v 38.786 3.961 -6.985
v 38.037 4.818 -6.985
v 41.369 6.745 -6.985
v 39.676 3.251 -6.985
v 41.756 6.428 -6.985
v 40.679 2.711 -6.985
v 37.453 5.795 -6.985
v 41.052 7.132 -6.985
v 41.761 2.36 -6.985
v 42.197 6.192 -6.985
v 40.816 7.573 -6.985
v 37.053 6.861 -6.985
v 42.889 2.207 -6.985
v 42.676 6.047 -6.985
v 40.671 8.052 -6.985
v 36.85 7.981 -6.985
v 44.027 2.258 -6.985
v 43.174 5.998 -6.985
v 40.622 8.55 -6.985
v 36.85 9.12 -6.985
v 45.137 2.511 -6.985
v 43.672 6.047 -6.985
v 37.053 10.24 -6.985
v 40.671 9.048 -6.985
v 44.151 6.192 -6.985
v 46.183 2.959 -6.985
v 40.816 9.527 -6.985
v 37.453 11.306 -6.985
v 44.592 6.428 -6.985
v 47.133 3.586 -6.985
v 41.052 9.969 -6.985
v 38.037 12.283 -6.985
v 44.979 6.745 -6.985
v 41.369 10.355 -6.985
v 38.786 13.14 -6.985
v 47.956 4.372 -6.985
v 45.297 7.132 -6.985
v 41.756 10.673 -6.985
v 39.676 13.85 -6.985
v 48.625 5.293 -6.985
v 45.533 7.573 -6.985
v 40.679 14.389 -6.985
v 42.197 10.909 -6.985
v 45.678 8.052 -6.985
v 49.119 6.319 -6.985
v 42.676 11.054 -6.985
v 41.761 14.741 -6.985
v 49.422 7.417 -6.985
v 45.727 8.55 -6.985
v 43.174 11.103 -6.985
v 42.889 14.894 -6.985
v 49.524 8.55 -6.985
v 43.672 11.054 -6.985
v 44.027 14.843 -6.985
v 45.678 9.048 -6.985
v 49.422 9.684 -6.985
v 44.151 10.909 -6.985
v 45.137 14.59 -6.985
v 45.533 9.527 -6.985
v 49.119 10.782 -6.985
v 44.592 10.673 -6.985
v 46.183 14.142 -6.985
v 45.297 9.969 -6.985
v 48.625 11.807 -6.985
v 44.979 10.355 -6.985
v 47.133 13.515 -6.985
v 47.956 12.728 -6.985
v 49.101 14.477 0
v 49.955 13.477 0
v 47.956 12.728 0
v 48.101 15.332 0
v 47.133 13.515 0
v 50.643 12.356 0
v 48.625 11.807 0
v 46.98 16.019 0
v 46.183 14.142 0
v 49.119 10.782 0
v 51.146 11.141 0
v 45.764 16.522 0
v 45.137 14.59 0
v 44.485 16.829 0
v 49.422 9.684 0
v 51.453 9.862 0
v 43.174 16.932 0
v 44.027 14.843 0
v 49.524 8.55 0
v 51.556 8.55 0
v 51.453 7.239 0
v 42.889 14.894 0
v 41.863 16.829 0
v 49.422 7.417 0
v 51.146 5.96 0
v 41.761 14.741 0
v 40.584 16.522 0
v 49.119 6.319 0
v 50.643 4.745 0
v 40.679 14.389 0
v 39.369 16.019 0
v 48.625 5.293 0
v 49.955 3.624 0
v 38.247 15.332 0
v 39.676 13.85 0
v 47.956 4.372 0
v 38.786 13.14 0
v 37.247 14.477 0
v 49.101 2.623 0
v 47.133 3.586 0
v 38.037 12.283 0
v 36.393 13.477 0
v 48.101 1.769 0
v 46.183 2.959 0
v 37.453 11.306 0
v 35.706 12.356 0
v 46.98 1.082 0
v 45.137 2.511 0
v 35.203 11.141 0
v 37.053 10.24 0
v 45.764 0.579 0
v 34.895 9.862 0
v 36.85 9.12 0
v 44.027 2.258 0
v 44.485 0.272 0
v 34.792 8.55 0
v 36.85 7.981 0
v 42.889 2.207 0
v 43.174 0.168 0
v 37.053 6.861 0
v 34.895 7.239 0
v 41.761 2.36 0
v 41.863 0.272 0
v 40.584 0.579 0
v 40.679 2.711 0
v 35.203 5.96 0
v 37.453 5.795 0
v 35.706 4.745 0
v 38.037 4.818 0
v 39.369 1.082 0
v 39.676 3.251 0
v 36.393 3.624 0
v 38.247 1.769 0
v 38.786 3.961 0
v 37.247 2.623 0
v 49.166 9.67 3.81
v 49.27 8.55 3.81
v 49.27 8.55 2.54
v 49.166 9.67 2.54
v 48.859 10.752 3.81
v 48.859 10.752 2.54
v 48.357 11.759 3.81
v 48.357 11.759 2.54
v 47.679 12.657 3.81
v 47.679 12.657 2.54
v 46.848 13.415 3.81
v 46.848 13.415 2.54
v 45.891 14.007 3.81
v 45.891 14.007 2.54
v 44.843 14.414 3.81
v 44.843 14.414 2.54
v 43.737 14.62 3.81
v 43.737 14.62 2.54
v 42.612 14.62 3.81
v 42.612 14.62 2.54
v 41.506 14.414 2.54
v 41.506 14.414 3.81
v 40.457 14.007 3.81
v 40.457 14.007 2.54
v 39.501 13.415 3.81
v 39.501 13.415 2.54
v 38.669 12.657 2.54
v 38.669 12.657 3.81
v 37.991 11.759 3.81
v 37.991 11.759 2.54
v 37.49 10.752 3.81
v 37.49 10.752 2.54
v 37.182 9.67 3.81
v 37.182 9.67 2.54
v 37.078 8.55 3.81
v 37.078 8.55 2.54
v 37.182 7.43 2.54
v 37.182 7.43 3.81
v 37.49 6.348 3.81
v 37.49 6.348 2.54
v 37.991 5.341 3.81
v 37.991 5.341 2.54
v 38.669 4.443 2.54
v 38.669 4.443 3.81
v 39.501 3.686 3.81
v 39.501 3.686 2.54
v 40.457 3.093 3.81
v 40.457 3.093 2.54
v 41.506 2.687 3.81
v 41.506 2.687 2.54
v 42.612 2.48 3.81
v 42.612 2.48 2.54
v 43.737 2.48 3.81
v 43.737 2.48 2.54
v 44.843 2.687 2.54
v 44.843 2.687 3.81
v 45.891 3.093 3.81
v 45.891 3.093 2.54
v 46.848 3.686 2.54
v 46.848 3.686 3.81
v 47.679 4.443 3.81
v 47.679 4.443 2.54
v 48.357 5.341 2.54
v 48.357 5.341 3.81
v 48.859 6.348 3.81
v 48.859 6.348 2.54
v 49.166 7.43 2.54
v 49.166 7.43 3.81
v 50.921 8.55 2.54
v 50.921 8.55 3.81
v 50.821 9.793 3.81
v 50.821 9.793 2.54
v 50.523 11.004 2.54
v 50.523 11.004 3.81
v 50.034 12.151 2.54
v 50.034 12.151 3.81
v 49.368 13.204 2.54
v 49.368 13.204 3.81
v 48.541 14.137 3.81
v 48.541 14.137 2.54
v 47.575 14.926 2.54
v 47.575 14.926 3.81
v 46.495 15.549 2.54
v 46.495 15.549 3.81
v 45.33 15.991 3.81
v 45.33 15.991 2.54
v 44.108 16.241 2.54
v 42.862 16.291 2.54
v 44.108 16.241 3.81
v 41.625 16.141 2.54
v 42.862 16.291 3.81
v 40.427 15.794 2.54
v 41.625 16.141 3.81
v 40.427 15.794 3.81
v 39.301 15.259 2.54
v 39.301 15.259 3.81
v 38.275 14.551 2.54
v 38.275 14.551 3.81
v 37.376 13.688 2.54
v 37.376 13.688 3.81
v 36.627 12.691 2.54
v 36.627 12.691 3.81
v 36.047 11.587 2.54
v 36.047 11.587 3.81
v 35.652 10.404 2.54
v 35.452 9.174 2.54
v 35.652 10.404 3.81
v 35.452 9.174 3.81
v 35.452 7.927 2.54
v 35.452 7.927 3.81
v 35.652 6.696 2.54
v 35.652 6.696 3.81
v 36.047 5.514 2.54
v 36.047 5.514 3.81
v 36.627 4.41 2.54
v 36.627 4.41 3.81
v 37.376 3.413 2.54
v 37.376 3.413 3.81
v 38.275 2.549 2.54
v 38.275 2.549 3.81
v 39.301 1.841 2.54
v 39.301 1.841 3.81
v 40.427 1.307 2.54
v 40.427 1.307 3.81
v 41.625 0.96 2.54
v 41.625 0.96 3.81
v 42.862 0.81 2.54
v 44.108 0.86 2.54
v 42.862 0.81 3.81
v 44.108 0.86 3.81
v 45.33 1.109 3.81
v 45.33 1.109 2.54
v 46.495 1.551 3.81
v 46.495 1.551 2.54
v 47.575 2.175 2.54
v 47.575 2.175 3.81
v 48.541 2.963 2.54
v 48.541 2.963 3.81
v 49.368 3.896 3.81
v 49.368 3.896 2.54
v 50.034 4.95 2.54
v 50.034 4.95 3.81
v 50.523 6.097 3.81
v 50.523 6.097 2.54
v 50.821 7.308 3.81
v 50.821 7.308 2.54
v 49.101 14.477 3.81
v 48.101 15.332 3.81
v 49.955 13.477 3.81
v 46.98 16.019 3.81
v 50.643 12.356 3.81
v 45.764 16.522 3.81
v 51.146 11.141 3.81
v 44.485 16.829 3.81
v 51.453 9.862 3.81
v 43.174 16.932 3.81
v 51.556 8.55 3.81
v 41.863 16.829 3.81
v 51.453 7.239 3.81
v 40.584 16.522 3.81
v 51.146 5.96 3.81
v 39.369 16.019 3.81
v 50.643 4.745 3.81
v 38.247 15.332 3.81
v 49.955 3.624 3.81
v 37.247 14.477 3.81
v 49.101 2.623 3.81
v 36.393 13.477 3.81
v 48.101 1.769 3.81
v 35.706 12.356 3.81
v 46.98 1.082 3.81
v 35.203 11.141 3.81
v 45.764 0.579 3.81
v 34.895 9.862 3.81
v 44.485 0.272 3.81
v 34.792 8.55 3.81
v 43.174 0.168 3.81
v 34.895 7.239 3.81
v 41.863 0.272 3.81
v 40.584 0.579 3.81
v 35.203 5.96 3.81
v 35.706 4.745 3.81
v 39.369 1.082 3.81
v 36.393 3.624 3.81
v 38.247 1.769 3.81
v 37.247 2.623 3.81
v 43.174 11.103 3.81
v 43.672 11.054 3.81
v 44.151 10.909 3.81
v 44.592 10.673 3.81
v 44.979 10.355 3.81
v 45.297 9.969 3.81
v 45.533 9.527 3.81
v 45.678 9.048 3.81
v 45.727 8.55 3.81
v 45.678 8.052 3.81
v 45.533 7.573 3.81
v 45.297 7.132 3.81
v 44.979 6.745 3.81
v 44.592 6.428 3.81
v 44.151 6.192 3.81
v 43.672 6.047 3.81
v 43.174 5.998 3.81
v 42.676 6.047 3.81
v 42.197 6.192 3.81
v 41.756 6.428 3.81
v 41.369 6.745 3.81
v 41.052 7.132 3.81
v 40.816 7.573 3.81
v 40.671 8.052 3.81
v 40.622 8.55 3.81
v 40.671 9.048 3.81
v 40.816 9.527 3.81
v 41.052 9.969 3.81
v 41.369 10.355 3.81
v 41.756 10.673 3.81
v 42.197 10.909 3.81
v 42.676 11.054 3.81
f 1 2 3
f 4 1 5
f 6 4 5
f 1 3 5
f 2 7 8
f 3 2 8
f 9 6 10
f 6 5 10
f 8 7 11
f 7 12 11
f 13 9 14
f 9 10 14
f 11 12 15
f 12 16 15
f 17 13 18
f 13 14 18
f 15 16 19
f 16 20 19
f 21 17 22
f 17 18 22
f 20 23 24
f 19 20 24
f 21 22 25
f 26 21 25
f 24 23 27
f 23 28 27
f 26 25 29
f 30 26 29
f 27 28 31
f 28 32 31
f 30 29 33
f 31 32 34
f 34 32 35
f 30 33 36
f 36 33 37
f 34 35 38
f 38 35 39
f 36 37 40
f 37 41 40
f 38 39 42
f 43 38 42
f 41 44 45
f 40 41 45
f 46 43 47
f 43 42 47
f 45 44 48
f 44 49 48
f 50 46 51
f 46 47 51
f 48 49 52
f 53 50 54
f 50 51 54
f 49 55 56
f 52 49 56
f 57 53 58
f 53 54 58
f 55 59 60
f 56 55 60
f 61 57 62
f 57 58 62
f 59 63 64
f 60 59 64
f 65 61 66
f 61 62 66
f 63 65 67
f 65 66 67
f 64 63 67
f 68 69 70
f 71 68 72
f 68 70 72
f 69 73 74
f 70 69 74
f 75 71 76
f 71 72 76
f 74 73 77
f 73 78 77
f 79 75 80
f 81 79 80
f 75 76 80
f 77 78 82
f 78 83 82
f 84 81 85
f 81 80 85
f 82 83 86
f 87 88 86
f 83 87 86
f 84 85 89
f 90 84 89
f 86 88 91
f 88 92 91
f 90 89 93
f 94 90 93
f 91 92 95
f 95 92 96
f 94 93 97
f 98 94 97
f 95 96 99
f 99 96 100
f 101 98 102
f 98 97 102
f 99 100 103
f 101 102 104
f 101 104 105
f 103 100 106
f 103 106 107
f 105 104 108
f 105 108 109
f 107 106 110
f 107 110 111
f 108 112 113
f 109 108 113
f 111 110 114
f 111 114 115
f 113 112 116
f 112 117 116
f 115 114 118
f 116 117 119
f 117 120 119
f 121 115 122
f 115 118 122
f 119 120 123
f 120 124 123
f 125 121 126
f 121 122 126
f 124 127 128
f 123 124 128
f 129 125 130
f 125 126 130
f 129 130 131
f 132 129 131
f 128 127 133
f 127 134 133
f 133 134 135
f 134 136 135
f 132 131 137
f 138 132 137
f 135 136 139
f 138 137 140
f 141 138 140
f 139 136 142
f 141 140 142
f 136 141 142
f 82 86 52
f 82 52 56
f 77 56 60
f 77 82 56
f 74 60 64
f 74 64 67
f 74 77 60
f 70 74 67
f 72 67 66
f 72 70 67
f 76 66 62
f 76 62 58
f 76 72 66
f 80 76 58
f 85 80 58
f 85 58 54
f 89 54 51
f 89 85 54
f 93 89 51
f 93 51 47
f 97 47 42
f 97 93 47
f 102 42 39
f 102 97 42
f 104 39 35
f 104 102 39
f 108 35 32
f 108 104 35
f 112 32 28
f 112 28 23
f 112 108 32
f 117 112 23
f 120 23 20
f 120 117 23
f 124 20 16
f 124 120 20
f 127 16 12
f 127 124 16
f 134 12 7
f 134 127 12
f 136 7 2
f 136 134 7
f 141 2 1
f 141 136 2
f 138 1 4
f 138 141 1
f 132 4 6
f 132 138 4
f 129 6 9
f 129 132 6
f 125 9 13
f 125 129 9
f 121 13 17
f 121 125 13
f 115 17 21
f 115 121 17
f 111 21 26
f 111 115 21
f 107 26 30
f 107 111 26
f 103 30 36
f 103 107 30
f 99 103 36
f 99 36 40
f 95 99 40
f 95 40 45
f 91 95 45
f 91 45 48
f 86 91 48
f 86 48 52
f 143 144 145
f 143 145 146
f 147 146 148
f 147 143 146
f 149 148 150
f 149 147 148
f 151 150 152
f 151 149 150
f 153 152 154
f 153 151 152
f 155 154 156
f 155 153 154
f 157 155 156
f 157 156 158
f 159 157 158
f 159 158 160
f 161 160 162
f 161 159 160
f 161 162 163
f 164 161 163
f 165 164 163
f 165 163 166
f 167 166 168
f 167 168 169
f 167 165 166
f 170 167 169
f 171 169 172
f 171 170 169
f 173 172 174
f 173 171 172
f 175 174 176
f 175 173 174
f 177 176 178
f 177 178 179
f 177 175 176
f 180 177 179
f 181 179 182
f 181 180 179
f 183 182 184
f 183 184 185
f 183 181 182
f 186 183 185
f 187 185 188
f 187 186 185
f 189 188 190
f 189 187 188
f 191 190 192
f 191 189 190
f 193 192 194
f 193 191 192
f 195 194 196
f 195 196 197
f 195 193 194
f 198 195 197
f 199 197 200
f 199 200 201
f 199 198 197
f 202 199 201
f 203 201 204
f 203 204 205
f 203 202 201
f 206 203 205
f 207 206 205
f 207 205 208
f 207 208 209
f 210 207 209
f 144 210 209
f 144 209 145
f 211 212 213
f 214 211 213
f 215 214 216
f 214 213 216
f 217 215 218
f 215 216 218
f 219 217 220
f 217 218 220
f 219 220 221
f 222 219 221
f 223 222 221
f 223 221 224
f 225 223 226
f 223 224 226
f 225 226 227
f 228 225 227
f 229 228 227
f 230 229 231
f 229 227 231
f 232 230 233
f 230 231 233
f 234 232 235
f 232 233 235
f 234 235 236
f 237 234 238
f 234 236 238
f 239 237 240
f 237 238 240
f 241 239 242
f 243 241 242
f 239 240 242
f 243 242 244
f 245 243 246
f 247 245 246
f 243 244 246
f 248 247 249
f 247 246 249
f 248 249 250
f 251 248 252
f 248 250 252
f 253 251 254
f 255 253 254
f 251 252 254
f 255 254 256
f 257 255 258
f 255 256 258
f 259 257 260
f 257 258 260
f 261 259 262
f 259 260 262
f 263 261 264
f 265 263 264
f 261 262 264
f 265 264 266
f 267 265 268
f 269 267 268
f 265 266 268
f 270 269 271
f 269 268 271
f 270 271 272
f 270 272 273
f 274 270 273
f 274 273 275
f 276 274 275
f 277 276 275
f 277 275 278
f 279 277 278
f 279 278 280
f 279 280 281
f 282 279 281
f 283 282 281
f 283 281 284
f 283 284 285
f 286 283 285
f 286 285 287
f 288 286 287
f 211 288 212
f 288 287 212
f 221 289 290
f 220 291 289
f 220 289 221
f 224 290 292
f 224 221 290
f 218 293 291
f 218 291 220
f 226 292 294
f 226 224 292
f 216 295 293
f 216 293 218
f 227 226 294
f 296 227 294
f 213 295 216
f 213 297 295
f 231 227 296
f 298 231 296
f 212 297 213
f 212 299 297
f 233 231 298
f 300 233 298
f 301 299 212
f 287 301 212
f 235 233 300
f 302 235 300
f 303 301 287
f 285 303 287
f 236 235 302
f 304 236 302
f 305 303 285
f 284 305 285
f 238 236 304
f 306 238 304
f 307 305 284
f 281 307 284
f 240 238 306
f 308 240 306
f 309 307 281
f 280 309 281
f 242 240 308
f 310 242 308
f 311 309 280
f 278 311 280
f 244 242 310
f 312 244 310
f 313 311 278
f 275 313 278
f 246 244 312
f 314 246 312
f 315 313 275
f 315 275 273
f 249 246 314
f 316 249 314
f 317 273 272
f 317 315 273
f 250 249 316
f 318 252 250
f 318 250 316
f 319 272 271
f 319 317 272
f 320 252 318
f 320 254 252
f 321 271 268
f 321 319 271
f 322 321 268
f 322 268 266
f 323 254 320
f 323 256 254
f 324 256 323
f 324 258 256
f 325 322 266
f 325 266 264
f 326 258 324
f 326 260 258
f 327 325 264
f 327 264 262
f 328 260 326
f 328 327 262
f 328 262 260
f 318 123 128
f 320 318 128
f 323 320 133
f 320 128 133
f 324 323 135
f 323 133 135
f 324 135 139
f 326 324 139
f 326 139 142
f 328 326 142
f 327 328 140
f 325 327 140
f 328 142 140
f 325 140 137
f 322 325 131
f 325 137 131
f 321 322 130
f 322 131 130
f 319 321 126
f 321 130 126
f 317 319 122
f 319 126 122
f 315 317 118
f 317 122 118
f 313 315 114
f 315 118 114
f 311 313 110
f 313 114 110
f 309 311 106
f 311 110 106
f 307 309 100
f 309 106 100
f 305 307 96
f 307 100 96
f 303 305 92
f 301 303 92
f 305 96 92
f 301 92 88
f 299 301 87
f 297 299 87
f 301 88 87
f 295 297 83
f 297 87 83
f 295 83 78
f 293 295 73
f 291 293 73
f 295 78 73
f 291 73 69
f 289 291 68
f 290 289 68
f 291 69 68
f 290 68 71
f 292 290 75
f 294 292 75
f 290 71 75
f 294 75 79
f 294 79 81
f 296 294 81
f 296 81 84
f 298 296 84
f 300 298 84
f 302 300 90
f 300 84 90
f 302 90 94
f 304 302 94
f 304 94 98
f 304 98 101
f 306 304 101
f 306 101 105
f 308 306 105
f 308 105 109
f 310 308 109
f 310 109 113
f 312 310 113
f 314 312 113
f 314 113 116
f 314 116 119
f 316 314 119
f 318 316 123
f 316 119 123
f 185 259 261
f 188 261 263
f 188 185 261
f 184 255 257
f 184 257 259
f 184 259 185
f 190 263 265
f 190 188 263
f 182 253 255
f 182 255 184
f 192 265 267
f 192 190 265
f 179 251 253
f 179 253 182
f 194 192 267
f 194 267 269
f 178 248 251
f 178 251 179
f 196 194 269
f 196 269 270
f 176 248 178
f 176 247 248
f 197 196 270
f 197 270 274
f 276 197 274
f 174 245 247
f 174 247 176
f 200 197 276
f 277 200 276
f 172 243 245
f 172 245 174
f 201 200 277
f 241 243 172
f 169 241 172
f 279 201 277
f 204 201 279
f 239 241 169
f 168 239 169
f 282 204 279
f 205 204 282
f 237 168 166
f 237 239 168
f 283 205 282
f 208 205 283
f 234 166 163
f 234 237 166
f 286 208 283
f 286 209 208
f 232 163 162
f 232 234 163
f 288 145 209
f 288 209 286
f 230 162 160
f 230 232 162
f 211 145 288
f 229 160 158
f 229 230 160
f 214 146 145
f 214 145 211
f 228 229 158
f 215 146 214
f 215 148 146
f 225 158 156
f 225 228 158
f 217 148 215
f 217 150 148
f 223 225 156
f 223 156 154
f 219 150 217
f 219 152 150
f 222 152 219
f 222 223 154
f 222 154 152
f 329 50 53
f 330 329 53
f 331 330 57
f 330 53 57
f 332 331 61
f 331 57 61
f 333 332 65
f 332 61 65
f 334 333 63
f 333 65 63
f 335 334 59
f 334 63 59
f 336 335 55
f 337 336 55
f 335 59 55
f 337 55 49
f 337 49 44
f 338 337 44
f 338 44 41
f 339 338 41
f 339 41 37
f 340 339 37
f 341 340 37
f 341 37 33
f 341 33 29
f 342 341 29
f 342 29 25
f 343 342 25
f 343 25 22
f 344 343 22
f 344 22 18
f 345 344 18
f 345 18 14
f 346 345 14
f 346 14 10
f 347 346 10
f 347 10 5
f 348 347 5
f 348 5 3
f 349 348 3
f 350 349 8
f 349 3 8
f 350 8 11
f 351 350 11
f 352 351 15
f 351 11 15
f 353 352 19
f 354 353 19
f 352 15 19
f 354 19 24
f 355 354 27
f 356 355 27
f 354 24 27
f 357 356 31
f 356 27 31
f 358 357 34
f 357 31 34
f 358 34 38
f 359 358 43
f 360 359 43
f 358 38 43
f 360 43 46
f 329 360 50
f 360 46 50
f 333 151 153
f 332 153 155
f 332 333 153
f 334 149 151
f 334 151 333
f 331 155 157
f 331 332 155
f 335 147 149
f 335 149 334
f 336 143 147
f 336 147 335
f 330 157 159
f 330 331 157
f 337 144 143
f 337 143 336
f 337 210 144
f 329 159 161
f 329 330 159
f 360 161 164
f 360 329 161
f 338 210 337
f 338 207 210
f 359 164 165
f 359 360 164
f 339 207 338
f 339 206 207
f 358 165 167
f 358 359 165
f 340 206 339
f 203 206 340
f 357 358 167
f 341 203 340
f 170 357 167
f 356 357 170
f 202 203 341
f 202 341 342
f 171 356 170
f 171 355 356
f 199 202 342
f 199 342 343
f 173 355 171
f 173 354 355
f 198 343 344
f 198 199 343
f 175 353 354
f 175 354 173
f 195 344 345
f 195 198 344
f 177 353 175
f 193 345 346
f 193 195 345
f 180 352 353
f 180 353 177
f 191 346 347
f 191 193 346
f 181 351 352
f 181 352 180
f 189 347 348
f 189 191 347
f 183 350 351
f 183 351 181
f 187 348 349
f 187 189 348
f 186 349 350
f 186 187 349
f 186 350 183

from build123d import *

# Parameters (mm, degrees)
SKETCH1_R           = 6.35
BOSS_EXTRUDE1_DEPTH = 6.985
SKETCH3_R           = 8.382
BOSS_EXTRUDE2_DEPTH = 3.81
SKETCH5_R           = 2.5527
CUT_EXTRUDE2_DEPTH  = 56.328875207
SKETCH6_R           = 7.747
SKETCH6_R_2         = 6.096
CUT_EXTRUDE3_DEPTH  = 1.27


with BuildPart() as part:
    # Sketch1 → Boss-Extrude1 (new body)
    with BuildSketch(Plane.XY):
        with Locations((43.174261814, 8.550344032)):
            Circle(SKETCH1_R)
    extrude(amount=-BOSS_EXTRUDE1_DEPTH)

    # Sketch3 → Boss-Extrude2 (add)
    with BuildSketch(Plane.XY):
        with Locations(Location((43.174261814, 8.550344032, 0), (0, 0, 180))):
            Circle(SKETCH3_R)
    extrude(amount=BOSS_EXTRUDE2_DEPTH)

    # Sketch5 → Cut-Extrude2 (cut, through all)
    with BuildSketch(Plane(origin=(0, 0, -6.985), x_dir=(-1, 0, 0), z_dir=(0, 0, -1))):
        with Locations(Location((-43.174261814, 8.550344032, 0), (0, 0, 90))):
            Circle(SKETCH5_R)
    extrude(amount=-CUT_EXTRUDE2_DEPTH, mode=Mode.SUBTRACT)

    # Sketch6 → Cut-Extrude3 (cut)
    with BuildSketch(Plane.XY.offset(3.81)):
        with Locations((43.174261814, 8.550344032)):
            Circle(SKETCH6_R)
        with Locations((43.174261814, 8.550344032)):
            Circle(SKETCH6_R_2, mode=Mode.SUBTRACT)
    extrude(amount=-CUT_EXTRUDE3_DEPTH, mode=Mode.SUBTRACT)


solid = part.part
